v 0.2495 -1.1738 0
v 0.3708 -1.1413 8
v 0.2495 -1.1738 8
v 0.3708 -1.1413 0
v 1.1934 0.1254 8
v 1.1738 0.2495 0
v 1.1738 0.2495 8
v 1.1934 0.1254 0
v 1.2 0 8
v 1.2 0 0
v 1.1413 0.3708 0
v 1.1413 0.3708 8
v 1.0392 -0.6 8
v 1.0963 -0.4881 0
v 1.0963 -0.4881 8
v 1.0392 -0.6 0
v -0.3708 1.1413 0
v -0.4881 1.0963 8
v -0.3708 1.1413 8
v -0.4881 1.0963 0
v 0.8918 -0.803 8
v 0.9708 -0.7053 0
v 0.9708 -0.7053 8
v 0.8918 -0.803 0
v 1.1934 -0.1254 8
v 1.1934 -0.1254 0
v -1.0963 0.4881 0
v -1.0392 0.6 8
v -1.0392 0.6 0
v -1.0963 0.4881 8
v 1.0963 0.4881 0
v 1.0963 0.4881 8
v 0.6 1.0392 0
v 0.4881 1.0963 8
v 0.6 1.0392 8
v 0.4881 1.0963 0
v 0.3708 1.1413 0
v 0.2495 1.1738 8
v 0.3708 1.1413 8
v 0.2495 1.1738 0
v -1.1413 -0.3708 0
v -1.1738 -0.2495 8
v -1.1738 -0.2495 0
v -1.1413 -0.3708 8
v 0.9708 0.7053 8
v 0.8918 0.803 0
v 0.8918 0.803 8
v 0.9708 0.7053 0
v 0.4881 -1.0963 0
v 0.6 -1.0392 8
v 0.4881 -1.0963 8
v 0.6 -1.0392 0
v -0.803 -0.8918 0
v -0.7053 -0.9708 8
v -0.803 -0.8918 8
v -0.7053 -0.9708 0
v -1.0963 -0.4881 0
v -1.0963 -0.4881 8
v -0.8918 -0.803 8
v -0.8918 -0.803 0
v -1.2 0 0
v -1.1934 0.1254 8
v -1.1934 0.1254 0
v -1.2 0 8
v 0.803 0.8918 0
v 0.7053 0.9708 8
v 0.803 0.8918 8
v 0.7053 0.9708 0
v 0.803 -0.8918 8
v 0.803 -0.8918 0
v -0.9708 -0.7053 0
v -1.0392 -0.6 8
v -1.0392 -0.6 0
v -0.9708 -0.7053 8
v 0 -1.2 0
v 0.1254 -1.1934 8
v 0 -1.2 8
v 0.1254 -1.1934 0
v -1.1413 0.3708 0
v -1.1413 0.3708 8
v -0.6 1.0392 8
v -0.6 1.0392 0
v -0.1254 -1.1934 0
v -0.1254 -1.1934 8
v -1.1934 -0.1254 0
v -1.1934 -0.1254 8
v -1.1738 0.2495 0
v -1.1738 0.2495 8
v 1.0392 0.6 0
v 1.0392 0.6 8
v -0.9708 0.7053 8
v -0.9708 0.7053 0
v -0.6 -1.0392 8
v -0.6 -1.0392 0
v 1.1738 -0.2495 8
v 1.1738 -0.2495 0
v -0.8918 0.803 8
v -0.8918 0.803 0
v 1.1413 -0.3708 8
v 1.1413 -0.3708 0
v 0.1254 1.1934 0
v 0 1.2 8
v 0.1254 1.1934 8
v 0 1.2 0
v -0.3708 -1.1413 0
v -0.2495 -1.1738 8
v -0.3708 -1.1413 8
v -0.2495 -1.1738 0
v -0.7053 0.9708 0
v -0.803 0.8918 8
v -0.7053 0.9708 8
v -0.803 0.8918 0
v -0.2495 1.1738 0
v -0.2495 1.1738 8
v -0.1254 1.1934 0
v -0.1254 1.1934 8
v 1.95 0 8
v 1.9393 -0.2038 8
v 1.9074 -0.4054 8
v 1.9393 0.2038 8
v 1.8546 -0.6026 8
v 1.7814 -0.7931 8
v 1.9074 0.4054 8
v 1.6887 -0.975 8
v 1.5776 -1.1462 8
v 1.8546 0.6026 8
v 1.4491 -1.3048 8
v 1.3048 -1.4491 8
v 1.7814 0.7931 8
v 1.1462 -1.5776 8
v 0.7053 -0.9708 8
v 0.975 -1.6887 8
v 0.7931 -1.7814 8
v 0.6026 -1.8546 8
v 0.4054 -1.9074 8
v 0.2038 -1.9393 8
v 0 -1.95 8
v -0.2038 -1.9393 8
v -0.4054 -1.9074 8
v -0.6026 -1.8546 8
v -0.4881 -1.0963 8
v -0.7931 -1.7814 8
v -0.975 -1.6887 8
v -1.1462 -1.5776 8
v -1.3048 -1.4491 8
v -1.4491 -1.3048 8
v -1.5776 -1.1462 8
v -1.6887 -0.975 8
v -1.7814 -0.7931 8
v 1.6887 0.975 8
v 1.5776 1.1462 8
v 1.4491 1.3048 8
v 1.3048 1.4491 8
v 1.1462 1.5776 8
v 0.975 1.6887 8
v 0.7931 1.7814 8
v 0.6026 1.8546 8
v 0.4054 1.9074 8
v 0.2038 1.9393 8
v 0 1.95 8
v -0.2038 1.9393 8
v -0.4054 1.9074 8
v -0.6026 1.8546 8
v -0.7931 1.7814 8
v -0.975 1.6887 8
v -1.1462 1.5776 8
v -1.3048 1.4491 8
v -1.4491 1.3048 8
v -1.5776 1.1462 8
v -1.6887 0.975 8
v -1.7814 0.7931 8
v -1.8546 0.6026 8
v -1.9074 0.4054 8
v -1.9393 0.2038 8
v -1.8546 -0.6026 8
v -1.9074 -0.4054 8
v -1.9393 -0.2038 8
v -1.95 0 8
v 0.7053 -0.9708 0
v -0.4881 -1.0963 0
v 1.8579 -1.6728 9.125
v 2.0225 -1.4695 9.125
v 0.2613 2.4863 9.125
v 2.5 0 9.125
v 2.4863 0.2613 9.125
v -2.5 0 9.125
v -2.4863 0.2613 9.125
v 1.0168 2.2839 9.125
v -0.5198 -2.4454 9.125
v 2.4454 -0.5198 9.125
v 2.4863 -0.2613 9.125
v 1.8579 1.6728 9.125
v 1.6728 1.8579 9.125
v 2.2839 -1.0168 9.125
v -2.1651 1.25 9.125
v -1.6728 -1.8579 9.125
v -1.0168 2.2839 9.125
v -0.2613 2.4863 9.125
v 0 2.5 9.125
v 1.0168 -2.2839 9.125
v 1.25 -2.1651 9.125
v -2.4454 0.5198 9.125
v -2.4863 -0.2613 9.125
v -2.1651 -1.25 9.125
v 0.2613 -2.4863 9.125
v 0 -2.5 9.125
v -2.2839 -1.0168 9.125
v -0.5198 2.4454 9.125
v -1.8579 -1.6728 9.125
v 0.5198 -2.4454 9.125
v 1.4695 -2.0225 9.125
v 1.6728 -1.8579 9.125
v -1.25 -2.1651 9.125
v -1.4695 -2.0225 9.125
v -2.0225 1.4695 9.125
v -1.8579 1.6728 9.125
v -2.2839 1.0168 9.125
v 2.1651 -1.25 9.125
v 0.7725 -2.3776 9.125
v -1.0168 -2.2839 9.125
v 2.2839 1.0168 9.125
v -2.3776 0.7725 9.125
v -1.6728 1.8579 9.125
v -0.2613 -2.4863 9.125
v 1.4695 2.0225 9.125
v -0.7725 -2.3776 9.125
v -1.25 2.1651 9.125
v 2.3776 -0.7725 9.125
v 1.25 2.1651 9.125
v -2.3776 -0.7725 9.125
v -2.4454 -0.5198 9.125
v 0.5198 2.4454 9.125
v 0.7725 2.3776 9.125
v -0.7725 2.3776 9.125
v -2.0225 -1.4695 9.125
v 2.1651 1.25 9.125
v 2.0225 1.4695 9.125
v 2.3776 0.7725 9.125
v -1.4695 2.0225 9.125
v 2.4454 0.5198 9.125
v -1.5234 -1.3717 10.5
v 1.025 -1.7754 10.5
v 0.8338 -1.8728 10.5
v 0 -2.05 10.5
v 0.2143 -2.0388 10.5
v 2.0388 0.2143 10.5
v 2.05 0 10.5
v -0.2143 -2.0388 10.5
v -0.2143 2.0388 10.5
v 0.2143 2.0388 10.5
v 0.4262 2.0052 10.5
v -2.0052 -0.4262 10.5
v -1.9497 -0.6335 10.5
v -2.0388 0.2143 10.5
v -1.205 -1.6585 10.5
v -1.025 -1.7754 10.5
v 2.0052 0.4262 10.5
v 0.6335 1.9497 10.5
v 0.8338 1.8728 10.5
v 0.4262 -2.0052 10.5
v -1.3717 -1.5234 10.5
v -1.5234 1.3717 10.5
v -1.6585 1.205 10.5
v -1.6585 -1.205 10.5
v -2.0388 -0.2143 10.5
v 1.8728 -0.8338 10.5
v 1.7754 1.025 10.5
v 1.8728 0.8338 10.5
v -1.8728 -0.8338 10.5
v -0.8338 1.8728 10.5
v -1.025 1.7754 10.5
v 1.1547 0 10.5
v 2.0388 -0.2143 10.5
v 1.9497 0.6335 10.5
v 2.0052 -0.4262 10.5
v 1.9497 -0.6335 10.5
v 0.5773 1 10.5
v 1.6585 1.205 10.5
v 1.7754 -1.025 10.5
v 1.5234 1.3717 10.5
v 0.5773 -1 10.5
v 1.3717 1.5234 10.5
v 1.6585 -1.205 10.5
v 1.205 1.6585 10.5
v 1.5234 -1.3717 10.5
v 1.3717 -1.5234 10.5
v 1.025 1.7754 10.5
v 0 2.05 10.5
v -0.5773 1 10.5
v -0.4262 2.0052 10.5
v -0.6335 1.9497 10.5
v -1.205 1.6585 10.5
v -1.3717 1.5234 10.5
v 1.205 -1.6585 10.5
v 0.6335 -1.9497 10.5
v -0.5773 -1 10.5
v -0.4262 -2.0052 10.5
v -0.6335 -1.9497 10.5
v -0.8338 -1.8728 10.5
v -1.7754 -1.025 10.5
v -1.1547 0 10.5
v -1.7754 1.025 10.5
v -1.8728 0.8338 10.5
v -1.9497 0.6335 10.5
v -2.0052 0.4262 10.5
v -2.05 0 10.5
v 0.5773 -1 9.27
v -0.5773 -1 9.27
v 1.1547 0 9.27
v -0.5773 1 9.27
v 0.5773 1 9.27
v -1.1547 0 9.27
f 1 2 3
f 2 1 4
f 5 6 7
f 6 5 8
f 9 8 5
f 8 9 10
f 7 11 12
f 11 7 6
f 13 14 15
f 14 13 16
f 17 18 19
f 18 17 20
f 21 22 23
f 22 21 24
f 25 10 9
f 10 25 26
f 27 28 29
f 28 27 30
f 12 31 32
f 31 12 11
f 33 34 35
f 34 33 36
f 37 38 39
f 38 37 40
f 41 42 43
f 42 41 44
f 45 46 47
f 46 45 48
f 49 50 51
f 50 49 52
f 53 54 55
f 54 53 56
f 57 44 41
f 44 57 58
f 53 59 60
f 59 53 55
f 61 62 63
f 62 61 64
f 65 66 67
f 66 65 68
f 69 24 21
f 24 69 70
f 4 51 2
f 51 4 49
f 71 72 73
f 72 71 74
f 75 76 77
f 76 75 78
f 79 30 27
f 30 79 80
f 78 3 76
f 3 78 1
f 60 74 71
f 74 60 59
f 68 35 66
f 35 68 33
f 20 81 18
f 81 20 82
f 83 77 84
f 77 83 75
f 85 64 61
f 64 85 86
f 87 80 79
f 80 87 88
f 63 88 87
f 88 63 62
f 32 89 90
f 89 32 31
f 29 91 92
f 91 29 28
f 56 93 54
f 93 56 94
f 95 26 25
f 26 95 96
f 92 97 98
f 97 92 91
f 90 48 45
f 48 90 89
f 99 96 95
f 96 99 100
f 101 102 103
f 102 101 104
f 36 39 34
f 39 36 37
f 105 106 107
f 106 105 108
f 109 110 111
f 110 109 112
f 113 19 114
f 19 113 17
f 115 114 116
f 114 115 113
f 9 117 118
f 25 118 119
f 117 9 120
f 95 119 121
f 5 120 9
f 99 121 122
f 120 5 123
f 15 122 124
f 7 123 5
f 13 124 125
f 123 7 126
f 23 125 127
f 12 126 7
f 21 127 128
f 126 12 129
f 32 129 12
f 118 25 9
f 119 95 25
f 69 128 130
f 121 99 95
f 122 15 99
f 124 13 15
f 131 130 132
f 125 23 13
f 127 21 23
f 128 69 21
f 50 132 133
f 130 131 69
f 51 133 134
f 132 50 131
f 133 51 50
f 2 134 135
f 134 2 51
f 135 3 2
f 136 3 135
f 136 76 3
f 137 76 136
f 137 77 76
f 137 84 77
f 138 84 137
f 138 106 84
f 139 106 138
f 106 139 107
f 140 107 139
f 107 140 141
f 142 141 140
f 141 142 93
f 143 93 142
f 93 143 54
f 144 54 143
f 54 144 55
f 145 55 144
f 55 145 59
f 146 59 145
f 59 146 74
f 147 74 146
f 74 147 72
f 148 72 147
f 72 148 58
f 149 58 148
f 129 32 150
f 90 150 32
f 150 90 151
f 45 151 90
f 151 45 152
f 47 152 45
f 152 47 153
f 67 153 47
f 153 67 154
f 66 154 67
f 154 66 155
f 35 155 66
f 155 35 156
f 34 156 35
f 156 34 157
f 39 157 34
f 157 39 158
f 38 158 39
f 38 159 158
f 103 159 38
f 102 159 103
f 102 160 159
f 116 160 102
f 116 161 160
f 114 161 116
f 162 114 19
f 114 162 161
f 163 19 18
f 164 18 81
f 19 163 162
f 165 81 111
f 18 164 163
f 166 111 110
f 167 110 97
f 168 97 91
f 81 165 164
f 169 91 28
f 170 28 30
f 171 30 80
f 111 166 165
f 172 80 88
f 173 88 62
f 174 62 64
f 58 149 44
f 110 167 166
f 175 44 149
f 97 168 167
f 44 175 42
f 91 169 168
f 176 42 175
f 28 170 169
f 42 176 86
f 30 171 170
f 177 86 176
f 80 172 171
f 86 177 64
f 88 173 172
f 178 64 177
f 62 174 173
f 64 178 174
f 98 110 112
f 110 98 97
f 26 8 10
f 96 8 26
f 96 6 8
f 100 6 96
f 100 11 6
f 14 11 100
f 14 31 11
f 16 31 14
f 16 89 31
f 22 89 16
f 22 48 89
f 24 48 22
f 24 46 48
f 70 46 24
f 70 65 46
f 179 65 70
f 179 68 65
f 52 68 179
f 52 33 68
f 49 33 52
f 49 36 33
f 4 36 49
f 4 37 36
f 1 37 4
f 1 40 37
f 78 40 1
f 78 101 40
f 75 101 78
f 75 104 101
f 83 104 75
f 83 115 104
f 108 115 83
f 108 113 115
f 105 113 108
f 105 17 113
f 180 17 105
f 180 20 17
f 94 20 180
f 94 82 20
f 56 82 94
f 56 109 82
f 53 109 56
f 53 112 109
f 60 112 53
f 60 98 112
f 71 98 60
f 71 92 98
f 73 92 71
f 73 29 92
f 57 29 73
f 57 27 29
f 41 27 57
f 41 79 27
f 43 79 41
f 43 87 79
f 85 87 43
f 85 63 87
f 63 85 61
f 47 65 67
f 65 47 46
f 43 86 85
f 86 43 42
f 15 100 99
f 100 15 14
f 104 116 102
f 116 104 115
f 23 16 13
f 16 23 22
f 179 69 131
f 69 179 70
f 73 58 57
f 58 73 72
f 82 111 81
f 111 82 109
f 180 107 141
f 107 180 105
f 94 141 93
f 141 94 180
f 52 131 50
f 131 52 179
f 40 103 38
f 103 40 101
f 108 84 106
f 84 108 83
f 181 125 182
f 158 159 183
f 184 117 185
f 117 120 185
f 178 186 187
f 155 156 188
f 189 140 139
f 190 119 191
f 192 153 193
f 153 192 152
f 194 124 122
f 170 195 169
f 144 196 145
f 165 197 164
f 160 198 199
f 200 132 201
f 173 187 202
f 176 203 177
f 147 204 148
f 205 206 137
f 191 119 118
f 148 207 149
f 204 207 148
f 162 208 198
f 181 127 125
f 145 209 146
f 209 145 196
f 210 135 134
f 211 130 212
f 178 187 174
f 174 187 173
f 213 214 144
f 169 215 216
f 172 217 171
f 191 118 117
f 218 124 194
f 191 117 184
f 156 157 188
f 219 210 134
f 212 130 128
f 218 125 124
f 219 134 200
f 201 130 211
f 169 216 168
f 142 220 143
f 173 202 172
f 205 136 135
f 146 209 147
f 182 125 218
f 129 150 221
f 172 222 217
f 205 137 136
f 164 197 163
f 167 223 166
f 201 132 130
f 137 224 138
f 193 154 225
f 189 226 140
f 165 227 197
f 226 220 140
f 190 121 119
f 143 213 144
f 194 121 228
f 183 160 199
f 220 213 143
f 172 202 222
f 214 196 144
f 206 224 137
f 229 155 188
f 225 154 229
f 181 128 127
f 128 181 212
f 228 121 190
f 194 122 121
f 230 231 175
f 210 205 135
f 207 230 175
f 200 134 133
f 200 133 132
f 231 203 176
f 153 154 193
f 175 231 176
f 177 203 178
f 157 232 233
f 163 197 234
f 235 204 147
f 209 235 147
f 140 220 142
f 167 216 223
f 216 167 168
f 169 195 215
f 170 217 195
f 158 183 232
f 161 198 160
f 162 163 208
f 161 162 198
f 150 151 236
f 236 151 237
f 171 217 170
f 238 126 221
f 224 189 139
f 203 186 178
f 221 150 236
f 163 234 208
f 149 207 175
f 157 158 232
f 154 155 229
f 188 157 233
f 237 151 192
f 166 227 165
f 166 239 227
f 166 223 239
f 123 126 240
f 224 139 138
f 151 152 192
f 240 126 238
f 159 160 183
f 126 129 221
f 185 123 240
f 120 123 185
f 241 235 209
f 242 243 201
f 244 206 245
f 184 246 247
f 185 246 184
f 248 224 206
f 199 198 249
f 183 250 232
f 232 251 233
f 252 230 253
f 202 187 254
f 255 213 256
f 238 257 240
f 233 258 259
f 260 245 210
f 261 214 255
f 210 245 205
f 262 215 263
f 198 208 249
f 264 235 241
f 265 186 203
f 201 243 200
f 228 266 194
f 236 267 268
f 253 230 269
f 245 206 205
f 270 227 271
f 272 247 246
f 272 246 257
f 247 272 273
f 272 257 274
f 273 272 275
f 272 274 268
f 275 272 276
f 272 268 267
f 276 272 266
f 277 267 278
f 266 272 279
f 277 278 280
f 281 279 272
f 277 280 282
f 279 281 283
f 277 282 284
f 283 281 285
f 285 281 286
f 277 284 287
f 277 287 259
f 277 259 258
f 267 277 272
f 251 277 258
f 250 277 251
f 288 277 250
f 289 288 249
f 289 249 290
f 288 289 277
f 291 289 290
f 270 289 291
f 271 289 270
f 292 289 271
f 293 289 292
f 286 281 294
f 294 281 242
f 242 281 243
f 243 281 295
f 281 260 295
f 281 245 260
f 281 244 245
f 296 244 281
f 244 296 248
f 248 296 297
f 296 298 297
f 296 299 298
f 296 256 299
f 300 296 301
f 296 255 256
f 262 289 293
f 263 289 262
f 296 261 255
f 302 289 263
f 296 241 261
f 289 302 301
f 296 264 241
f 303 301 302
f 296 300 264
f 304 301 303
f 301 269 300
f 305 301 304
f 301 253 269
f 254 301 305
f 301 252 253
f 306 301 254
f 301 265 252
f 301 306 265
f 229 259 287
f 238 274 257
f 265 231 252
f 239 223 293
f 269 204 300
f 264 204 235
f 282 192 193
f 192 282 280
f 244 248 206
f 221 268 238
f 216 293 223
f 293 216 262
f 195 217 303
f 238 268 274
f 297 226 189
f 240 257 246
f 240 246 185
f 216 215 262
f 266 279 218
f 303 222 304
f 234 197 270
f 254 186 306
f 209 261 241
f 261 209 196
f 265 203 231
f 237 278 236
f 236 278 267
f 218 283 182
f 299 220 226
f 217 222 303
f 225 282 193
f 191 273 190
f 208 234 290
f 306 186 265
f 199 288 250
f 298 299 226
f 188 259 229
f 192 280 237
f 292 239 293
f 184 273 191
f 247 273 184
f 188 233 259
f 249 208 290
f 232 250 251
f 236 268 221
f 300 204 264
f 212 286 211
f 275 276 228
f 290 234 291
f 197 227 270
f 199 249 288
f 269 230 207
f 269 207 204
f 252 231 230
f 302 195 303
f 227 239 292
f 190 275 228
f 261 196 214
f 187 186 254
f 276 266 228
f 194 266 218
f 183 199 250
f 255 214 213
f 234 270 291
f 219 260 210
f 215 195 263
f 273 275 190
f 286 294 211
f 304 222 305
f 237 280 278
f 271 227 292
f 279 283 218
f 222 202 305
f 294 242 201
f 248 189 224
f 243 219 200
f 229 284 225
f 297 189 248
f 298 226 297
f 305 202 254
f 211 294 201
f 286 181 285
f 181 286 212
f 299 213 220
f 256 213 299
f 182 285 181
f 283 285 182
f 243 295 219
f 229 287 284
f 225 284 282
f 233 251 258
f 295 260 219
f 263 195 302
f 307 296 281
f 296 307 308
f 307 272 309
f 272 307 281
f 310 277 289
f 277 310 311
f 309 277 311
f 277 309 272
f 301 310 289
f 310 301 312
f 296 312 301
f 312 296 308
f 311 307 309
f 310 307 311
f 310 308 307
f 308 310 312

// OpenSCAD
// Low-profile button-head screw.
$fn = 60;
eps = 0.02;
shaft_d = 2.4;
head_d = 5;
head_h = 2.5;
shaft_l = 8;
socket_flat = head_d * 0.40;
difference() {
    union() {
        cylinder(d = shaft_d, h = shaft_l);
        translate([0, 0, shaft_l]) cylinder(d1 = shaft_d + 1.5, d2 = head_d, h = head_h * 0.45);
        translate([0, 0, shaft_l + head_h * 0.45]) cylinder(d1 = head_d, d2 = head_d * 0.82, h = head_h * 0.55);
    }
    translate([0, 0, shaft_l + head_h - head_h * 0.5 + eps])
        cylinder(d = socket_flat / cos(30), h = head_h * 0.5 + eps, $fn = 6);
}
